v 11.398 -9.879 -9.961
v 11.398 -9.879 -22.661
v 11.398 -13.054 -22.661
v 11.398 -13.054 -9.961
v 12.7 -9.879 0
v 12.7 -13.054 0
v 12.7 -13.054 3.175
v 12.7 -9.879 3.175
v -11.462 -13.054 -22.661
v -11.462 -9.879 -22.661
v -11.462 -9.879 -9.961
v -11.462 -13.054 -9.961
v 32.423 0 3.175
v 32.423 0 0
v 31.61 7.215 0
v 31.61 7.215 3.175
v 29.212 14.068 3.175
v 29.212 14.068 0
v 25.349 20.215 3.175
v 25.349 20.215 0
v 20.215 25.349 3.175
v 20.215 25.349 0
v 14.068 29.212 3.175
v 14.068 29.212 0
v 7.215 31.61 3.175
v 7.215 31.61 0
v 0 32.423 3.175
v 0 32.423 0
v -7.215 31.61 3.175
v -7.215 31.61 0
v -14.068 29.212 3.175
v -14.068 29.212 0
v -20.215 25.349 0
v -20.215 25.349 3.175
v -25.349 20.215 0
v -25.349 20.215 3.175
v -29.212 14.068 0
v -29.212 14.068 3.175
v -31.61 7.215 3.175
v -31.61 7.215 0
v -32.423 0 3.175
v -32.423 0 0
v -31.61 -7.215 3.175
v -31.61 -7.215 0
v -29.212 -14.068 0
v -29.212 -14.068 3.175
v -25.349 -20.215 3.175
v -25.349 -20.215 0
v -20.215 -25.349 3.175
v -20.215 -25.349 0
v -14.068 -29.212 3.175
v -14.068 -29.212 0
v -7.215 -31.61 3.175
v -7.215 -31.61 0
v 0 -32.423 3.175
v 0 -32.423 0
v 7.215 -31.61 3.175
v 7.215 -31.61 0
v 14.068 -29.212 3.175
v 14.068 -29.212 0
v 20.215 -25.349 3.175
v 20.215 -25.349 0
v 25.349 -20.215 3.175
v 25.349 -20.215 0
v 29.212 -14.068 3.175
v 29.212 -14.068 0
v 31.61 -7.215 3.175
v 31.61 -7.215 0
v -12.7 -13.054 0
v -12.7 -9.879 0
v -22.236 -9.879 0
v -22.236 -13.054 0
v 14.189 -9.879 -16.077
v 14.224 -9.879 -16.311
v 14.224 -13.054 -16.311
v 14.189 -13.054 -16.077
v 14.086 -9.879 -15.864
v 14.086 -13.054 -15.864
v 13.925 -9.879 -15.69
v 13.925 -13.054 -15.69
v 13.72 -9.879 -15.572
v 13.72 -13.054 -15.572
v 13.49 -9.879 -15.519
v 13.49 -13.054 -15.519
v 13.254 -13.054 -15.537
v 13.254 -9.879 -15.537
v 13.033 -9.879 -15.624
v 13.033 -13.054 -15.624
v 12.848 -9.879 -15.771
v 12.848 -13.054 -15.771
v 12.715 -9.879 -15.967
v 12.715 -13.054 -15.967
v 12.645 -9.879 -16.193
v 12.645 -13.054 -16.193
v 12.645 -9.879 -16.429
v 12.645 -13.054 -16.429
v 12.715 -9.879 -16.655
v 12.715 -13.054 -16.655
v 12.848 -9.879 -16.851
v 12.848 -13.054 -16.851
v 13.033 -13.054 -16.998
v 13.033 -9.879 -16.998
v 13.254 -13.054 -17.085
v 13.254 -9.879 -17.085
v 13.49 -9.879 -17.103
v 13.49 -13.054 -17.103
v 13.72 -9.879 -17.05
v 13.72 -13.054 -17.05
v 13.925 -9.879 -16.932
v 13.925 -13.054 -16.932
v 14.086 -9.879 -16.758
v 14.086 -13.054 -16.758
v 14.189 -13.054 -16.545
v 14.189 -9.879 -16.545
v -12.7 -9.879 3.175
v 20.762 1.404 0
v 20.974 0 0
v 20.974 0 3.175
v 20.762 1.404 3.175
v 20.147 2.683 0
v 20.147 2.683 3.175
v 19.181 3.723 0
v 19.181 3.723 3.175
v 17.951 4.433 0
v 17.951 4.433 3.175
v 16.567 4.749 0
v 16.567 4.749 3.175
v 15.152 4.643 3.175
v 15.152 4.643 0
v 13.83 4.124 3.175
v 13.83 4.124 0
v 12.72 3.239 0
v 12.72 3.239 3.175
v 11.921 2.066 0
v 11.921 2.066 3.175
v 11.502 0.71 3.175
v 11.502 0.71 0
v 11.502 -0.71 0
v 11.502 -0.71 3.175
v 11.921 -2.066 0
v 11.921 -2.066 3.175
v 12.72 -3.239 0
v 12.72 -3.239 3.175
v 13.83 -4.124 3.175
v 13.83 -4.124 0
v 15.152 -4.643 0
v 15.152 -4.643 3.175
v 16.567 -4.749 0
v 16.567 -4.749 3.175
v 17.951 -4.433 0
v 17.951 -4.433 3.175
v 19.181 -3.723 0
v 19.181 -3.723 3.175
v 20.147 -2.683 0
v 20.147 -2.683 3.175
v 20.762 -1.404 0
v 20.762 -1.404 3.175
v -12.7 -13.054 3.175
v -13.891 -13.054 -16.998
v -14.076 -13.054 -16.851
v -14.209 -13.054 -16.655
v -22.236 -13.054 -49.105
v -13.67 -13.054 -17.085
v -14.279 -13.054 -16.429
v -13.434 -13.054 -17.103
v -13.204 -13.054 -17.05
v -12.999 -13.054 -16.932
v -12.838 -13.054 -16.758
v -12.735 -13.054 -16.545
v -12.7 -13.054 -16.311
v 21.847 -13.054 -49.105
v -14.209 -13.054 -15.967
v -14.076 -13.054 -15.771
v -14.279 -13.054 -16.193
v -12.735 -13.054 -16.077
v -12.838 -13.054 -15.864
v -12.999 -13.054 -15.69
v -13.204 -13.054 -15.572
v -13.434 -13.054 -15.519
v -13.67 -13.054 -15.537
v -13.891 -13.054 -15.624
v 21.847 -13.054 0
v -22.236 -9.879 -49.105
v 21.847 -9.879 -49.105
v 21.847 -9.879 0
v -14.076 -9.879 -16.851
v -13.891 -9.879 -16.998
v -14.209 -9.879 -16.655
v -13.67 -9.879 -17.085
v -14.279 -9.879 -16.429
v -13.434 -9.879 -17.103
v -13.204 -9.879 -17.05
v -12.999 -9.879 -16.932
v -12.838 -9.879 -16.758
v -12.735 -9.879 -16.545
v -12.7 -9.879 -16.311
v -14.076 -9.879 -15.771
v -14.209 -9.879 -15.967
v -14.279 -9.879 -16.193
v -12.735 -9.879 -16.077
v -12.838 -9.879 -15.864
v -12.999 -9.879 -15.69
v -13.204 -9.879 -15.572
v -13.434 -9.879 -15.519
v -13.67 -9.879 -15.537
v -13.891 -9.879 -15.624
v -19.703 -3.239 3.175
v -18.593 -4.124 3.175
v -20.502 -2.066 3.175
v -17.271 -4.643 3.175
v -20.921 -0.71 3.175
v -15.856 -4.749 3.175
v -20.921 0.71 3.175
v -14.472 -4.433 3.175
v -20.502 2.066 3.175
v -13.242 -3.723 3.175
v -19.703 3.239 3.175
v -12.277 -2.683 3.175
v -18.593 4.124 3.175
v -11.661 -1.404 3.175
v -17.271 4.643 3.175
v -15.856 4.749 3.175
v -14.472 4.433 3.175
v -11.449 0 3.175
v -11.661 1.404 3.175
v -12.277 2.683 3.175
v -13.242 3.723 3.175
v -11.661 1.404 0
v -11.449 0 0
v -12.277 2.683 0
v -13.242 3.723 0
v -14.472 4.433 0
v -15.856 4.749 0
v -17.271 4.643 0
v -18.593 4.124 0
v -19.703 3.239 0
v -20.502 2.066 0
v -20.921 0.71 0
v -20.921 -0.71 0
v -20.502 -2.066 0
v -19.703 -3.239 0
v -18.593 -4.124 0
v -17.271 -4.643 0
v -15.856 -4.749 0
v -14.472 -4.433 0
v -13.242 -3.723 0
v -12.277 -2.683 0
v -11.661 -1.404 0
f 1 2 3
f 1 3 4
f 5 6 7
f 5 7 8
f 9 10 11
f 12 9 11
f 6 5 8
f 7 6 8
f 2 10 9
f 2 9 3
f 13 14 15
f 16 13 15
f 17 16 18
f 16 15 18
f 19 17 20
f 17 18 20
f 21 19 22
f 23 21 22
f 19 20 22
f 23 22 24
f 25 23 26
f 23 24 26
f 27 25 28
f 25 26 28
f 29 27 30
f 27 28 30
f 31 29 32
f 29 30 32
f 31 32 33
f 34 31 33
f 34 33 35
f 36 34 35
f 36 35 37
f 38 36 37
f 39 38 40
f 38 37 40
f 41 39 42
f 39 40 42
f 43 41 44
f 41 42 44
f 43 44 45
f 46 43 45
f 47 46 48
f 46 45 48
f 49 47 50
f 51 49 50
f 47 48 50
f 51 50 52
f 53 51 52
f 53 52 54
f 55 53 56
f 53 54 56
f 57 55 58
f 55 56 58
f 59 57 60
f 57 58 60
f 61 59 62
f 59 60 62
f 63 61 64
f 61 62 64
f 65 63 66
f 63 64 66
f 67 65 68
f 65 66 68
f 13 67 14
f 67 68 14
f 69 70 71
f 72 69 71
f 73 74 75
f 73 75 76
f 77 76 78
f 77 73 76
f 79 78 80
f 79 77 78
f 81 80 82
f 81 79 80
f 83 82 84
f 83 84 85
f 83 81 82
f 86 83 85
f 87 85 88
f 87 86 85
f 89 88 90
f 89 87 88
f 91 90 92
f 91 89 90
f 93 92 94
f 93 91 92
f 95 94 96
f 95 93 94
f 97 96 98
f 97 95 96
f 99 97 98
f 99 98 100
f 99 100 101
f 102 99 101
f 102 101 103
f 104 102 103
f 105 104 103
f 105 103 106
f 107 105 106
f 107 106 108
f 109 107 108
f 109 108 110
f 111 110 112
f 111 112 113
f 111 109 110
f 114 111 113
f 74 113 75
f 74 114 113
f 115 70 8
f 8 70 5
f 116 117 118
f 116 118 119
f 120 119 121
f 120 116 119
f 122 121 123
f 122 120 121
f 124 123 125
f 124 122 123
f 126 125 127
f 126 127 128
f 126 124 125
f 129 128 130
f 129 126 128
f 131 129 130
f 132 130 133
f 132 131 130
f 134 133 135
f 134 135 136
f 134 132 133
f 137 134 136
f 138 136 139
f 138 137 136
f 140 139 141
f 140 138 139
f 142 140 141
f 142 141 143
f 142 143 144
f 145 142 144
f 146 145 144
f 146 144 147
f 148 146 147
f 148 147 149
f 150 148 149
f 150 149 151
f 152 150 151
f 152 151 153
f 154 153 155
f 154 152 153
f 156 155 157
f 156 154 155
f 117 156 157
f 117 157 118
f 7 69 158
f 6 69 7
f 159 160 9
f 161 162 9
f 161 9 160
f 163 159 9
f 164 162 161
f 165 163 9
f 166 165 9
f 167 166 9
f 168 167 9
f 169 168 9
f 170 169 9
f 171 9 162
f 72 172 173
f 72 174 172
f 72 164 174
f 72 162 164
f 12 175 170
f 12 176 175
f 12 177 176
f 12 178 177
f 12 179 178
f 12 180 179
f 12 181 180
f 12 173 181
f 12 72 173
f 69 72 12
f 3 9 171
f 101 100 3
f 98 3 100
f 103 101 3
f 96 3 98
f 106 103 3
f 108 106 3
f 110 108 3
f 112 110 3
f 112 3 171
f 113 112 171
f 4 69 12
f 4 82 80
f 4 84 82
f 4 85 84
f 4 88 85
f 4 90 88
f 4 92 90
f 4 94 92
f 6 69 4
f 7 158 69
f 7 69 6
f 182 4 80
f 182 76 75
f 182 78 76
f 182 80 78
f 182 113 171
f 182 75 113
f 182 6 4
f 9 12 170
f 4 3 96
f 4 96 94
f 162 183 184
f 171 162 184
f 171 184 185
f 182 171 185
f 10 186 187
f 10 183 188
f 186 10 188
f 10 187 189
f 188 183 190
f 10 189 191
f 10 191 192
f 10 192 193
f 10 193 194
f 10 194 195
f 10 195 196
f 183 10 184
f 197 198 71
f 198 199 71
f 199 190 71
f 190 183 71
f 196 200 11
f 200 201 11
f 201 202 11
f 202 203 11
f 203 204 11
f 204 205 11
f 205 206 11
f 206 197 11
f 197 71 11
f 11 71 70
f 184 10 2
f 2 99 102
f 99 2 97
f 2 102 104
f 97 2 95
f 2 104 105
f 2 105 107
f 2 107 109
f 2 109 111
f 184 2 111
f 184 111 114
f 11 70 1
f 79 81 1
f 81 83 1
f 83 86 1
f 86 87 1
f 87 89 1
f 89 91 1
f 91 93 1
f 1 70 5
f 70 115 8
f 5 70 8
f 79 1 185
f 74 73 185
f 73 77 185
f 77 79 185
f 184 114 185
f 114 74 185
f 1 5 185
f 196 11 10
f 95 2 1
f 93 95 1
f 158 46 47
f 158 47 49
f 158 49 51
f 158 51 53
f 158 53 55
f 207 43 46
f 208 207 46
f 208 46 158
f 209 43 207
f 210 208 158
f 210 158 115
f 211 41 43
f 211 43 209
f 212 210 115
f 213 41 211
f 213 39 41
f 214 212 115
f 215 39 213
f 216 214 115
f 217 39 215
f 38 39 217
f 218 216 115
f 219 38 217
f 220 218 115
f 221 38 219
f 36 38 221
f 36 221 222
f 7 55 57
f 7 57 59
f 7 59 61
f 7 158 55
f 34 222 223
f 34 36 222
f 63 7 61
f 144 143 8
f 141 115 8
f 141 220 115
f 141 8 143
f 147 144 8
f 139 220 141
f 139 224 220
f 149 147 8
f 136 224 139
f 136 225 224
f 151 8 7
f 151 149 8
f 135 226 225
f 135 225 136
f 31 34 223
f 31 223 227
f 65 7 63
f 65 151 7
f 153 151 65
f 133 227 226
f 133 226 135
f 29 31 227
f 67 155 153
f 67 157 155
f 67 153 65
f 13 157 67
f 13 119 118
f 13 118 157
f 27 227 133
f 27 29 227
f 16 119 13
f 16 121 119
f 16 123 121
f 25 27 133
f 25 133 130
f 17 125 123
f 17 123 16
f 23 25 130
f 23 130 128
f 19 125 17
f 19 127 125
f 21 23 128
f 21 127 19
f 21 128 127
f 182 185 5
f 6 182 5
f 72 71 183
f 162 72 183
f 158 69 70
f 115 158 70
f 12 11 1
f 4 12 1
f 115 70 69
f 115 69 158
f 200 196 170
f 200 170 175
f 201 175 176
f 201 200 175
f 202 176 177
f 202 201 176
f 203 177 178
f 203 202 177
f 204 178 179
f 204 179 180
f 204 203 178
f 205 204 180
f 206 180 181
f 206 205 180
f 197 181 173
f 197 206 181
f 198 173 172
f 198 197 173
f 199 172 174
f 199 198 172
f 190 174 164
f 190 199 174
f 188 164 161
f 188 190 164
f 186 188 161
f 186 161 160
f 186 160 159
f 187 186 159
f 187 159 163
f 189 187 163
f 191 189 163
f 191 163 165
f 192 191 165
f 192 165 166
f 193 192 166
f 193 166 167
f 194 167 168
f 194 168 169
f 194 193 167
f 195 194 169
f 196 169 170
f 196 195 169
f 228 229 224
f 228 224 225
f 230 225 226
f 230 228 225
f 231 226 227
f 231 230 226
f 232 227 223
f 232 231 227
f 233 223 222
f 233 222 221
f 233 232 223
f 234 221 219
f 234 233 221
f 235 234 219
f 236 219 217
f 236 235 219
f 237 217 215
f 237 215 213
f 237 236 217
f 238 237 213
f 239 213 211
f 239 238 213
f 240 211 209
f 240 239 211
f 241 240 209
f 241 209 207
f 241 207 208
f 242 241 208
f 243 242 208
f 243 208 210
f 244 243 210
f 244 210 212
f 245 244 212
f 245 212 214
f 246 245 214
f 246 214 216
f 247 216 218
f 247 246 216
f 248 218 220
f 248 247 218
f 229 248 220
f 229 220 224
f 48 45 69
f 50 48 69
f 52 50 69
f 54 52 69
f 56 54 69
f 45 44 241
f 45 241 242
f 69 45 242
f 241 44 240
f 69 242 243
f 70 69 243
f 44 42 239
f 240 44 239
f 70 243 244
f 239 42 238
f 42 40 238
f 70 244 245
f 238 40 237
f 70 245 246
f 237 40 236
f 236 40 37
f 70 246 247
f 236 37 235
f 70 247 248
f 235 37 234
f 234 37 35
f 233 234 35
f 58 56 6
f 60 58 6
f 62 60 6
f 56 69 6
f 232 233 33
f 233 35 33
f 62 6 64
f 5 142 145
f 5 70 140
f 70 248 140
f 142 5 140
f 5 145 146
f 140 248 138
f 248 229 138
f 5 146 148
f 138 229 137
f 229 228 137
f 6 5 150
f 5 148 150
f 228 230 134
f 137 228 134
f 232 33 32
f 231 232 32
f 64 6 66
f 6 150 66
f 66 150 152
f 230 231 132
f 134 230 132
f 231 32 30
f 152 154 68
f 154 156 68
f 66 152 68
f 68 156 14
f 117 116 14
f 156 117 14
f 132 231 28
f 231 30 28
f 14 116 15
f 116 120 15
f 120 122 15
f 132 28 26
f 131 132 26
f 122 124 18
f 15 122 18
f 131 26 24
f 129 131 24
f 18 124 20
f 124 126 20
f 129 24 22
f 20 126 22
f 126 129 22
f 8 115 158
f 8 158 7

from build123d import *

# Parameters (mm, degrees)
F0_R     = 32.4231
F0_W     = 25.4
F0_H     = 3.175
F0_R_2   = 4.7625
F1_DEPTH = 3.175
F2_R     = 0.79375
F2_W     = 22.86
F2_H     = 12.7
F2_W_2   = 25.4
F2_H_2   = 3.175
F3_DEPTH = 3.175


with BuildPart() as f1:
    # F0 (on Top) → F1 (new body)
    with BuildSketch(Plane.XY):
        Circle(F0_R)
        with Locations((0, -11.466003)):
            Rectangle(F0_W, F0_H, mode=Mode.SUBTRACT)
        with Locations((-16.21155, 0)):
            Circle(F0_R_2, mode=Mode.SUBTRACT)
        with Locations((16.21155, 0)):
            Circle(F0_R_2, mode=Mode.SUBTRACT)
    extrude(amount=F1_DEPTH)


with BuildPart() as f3:
    # F2 (on face) → F3 (new body)
    with BuildSketch(Plane.XZ.offset(9.878503)):
        Polygon((12.7, 0), (-12.7, 0), (-22.235729, 0), (-22.235729, -49.104631), (21.84733, -49.104631), (21.84733, 0), align=None)
        with Locations((-13.49375, -16.311007)):
            Circle(F2_R, mode=Mode.SUBTRACT)
        with Locations((-0.03175, -16.311007)):
            Rectangle(F2_W, F2_H, mode=Mode.SUBTRACT)
        with Locations((13.43025, -16.311007)):
            Circle(F2_R, mode=Mode.SUBTRACT)
        with Locations((0, 1.5875)):
            Rectangle(F2_W_2, F2_H_2)
    extrude(amount=F3_DEPTH)


solid = Compound([f1.part, f3.part])
